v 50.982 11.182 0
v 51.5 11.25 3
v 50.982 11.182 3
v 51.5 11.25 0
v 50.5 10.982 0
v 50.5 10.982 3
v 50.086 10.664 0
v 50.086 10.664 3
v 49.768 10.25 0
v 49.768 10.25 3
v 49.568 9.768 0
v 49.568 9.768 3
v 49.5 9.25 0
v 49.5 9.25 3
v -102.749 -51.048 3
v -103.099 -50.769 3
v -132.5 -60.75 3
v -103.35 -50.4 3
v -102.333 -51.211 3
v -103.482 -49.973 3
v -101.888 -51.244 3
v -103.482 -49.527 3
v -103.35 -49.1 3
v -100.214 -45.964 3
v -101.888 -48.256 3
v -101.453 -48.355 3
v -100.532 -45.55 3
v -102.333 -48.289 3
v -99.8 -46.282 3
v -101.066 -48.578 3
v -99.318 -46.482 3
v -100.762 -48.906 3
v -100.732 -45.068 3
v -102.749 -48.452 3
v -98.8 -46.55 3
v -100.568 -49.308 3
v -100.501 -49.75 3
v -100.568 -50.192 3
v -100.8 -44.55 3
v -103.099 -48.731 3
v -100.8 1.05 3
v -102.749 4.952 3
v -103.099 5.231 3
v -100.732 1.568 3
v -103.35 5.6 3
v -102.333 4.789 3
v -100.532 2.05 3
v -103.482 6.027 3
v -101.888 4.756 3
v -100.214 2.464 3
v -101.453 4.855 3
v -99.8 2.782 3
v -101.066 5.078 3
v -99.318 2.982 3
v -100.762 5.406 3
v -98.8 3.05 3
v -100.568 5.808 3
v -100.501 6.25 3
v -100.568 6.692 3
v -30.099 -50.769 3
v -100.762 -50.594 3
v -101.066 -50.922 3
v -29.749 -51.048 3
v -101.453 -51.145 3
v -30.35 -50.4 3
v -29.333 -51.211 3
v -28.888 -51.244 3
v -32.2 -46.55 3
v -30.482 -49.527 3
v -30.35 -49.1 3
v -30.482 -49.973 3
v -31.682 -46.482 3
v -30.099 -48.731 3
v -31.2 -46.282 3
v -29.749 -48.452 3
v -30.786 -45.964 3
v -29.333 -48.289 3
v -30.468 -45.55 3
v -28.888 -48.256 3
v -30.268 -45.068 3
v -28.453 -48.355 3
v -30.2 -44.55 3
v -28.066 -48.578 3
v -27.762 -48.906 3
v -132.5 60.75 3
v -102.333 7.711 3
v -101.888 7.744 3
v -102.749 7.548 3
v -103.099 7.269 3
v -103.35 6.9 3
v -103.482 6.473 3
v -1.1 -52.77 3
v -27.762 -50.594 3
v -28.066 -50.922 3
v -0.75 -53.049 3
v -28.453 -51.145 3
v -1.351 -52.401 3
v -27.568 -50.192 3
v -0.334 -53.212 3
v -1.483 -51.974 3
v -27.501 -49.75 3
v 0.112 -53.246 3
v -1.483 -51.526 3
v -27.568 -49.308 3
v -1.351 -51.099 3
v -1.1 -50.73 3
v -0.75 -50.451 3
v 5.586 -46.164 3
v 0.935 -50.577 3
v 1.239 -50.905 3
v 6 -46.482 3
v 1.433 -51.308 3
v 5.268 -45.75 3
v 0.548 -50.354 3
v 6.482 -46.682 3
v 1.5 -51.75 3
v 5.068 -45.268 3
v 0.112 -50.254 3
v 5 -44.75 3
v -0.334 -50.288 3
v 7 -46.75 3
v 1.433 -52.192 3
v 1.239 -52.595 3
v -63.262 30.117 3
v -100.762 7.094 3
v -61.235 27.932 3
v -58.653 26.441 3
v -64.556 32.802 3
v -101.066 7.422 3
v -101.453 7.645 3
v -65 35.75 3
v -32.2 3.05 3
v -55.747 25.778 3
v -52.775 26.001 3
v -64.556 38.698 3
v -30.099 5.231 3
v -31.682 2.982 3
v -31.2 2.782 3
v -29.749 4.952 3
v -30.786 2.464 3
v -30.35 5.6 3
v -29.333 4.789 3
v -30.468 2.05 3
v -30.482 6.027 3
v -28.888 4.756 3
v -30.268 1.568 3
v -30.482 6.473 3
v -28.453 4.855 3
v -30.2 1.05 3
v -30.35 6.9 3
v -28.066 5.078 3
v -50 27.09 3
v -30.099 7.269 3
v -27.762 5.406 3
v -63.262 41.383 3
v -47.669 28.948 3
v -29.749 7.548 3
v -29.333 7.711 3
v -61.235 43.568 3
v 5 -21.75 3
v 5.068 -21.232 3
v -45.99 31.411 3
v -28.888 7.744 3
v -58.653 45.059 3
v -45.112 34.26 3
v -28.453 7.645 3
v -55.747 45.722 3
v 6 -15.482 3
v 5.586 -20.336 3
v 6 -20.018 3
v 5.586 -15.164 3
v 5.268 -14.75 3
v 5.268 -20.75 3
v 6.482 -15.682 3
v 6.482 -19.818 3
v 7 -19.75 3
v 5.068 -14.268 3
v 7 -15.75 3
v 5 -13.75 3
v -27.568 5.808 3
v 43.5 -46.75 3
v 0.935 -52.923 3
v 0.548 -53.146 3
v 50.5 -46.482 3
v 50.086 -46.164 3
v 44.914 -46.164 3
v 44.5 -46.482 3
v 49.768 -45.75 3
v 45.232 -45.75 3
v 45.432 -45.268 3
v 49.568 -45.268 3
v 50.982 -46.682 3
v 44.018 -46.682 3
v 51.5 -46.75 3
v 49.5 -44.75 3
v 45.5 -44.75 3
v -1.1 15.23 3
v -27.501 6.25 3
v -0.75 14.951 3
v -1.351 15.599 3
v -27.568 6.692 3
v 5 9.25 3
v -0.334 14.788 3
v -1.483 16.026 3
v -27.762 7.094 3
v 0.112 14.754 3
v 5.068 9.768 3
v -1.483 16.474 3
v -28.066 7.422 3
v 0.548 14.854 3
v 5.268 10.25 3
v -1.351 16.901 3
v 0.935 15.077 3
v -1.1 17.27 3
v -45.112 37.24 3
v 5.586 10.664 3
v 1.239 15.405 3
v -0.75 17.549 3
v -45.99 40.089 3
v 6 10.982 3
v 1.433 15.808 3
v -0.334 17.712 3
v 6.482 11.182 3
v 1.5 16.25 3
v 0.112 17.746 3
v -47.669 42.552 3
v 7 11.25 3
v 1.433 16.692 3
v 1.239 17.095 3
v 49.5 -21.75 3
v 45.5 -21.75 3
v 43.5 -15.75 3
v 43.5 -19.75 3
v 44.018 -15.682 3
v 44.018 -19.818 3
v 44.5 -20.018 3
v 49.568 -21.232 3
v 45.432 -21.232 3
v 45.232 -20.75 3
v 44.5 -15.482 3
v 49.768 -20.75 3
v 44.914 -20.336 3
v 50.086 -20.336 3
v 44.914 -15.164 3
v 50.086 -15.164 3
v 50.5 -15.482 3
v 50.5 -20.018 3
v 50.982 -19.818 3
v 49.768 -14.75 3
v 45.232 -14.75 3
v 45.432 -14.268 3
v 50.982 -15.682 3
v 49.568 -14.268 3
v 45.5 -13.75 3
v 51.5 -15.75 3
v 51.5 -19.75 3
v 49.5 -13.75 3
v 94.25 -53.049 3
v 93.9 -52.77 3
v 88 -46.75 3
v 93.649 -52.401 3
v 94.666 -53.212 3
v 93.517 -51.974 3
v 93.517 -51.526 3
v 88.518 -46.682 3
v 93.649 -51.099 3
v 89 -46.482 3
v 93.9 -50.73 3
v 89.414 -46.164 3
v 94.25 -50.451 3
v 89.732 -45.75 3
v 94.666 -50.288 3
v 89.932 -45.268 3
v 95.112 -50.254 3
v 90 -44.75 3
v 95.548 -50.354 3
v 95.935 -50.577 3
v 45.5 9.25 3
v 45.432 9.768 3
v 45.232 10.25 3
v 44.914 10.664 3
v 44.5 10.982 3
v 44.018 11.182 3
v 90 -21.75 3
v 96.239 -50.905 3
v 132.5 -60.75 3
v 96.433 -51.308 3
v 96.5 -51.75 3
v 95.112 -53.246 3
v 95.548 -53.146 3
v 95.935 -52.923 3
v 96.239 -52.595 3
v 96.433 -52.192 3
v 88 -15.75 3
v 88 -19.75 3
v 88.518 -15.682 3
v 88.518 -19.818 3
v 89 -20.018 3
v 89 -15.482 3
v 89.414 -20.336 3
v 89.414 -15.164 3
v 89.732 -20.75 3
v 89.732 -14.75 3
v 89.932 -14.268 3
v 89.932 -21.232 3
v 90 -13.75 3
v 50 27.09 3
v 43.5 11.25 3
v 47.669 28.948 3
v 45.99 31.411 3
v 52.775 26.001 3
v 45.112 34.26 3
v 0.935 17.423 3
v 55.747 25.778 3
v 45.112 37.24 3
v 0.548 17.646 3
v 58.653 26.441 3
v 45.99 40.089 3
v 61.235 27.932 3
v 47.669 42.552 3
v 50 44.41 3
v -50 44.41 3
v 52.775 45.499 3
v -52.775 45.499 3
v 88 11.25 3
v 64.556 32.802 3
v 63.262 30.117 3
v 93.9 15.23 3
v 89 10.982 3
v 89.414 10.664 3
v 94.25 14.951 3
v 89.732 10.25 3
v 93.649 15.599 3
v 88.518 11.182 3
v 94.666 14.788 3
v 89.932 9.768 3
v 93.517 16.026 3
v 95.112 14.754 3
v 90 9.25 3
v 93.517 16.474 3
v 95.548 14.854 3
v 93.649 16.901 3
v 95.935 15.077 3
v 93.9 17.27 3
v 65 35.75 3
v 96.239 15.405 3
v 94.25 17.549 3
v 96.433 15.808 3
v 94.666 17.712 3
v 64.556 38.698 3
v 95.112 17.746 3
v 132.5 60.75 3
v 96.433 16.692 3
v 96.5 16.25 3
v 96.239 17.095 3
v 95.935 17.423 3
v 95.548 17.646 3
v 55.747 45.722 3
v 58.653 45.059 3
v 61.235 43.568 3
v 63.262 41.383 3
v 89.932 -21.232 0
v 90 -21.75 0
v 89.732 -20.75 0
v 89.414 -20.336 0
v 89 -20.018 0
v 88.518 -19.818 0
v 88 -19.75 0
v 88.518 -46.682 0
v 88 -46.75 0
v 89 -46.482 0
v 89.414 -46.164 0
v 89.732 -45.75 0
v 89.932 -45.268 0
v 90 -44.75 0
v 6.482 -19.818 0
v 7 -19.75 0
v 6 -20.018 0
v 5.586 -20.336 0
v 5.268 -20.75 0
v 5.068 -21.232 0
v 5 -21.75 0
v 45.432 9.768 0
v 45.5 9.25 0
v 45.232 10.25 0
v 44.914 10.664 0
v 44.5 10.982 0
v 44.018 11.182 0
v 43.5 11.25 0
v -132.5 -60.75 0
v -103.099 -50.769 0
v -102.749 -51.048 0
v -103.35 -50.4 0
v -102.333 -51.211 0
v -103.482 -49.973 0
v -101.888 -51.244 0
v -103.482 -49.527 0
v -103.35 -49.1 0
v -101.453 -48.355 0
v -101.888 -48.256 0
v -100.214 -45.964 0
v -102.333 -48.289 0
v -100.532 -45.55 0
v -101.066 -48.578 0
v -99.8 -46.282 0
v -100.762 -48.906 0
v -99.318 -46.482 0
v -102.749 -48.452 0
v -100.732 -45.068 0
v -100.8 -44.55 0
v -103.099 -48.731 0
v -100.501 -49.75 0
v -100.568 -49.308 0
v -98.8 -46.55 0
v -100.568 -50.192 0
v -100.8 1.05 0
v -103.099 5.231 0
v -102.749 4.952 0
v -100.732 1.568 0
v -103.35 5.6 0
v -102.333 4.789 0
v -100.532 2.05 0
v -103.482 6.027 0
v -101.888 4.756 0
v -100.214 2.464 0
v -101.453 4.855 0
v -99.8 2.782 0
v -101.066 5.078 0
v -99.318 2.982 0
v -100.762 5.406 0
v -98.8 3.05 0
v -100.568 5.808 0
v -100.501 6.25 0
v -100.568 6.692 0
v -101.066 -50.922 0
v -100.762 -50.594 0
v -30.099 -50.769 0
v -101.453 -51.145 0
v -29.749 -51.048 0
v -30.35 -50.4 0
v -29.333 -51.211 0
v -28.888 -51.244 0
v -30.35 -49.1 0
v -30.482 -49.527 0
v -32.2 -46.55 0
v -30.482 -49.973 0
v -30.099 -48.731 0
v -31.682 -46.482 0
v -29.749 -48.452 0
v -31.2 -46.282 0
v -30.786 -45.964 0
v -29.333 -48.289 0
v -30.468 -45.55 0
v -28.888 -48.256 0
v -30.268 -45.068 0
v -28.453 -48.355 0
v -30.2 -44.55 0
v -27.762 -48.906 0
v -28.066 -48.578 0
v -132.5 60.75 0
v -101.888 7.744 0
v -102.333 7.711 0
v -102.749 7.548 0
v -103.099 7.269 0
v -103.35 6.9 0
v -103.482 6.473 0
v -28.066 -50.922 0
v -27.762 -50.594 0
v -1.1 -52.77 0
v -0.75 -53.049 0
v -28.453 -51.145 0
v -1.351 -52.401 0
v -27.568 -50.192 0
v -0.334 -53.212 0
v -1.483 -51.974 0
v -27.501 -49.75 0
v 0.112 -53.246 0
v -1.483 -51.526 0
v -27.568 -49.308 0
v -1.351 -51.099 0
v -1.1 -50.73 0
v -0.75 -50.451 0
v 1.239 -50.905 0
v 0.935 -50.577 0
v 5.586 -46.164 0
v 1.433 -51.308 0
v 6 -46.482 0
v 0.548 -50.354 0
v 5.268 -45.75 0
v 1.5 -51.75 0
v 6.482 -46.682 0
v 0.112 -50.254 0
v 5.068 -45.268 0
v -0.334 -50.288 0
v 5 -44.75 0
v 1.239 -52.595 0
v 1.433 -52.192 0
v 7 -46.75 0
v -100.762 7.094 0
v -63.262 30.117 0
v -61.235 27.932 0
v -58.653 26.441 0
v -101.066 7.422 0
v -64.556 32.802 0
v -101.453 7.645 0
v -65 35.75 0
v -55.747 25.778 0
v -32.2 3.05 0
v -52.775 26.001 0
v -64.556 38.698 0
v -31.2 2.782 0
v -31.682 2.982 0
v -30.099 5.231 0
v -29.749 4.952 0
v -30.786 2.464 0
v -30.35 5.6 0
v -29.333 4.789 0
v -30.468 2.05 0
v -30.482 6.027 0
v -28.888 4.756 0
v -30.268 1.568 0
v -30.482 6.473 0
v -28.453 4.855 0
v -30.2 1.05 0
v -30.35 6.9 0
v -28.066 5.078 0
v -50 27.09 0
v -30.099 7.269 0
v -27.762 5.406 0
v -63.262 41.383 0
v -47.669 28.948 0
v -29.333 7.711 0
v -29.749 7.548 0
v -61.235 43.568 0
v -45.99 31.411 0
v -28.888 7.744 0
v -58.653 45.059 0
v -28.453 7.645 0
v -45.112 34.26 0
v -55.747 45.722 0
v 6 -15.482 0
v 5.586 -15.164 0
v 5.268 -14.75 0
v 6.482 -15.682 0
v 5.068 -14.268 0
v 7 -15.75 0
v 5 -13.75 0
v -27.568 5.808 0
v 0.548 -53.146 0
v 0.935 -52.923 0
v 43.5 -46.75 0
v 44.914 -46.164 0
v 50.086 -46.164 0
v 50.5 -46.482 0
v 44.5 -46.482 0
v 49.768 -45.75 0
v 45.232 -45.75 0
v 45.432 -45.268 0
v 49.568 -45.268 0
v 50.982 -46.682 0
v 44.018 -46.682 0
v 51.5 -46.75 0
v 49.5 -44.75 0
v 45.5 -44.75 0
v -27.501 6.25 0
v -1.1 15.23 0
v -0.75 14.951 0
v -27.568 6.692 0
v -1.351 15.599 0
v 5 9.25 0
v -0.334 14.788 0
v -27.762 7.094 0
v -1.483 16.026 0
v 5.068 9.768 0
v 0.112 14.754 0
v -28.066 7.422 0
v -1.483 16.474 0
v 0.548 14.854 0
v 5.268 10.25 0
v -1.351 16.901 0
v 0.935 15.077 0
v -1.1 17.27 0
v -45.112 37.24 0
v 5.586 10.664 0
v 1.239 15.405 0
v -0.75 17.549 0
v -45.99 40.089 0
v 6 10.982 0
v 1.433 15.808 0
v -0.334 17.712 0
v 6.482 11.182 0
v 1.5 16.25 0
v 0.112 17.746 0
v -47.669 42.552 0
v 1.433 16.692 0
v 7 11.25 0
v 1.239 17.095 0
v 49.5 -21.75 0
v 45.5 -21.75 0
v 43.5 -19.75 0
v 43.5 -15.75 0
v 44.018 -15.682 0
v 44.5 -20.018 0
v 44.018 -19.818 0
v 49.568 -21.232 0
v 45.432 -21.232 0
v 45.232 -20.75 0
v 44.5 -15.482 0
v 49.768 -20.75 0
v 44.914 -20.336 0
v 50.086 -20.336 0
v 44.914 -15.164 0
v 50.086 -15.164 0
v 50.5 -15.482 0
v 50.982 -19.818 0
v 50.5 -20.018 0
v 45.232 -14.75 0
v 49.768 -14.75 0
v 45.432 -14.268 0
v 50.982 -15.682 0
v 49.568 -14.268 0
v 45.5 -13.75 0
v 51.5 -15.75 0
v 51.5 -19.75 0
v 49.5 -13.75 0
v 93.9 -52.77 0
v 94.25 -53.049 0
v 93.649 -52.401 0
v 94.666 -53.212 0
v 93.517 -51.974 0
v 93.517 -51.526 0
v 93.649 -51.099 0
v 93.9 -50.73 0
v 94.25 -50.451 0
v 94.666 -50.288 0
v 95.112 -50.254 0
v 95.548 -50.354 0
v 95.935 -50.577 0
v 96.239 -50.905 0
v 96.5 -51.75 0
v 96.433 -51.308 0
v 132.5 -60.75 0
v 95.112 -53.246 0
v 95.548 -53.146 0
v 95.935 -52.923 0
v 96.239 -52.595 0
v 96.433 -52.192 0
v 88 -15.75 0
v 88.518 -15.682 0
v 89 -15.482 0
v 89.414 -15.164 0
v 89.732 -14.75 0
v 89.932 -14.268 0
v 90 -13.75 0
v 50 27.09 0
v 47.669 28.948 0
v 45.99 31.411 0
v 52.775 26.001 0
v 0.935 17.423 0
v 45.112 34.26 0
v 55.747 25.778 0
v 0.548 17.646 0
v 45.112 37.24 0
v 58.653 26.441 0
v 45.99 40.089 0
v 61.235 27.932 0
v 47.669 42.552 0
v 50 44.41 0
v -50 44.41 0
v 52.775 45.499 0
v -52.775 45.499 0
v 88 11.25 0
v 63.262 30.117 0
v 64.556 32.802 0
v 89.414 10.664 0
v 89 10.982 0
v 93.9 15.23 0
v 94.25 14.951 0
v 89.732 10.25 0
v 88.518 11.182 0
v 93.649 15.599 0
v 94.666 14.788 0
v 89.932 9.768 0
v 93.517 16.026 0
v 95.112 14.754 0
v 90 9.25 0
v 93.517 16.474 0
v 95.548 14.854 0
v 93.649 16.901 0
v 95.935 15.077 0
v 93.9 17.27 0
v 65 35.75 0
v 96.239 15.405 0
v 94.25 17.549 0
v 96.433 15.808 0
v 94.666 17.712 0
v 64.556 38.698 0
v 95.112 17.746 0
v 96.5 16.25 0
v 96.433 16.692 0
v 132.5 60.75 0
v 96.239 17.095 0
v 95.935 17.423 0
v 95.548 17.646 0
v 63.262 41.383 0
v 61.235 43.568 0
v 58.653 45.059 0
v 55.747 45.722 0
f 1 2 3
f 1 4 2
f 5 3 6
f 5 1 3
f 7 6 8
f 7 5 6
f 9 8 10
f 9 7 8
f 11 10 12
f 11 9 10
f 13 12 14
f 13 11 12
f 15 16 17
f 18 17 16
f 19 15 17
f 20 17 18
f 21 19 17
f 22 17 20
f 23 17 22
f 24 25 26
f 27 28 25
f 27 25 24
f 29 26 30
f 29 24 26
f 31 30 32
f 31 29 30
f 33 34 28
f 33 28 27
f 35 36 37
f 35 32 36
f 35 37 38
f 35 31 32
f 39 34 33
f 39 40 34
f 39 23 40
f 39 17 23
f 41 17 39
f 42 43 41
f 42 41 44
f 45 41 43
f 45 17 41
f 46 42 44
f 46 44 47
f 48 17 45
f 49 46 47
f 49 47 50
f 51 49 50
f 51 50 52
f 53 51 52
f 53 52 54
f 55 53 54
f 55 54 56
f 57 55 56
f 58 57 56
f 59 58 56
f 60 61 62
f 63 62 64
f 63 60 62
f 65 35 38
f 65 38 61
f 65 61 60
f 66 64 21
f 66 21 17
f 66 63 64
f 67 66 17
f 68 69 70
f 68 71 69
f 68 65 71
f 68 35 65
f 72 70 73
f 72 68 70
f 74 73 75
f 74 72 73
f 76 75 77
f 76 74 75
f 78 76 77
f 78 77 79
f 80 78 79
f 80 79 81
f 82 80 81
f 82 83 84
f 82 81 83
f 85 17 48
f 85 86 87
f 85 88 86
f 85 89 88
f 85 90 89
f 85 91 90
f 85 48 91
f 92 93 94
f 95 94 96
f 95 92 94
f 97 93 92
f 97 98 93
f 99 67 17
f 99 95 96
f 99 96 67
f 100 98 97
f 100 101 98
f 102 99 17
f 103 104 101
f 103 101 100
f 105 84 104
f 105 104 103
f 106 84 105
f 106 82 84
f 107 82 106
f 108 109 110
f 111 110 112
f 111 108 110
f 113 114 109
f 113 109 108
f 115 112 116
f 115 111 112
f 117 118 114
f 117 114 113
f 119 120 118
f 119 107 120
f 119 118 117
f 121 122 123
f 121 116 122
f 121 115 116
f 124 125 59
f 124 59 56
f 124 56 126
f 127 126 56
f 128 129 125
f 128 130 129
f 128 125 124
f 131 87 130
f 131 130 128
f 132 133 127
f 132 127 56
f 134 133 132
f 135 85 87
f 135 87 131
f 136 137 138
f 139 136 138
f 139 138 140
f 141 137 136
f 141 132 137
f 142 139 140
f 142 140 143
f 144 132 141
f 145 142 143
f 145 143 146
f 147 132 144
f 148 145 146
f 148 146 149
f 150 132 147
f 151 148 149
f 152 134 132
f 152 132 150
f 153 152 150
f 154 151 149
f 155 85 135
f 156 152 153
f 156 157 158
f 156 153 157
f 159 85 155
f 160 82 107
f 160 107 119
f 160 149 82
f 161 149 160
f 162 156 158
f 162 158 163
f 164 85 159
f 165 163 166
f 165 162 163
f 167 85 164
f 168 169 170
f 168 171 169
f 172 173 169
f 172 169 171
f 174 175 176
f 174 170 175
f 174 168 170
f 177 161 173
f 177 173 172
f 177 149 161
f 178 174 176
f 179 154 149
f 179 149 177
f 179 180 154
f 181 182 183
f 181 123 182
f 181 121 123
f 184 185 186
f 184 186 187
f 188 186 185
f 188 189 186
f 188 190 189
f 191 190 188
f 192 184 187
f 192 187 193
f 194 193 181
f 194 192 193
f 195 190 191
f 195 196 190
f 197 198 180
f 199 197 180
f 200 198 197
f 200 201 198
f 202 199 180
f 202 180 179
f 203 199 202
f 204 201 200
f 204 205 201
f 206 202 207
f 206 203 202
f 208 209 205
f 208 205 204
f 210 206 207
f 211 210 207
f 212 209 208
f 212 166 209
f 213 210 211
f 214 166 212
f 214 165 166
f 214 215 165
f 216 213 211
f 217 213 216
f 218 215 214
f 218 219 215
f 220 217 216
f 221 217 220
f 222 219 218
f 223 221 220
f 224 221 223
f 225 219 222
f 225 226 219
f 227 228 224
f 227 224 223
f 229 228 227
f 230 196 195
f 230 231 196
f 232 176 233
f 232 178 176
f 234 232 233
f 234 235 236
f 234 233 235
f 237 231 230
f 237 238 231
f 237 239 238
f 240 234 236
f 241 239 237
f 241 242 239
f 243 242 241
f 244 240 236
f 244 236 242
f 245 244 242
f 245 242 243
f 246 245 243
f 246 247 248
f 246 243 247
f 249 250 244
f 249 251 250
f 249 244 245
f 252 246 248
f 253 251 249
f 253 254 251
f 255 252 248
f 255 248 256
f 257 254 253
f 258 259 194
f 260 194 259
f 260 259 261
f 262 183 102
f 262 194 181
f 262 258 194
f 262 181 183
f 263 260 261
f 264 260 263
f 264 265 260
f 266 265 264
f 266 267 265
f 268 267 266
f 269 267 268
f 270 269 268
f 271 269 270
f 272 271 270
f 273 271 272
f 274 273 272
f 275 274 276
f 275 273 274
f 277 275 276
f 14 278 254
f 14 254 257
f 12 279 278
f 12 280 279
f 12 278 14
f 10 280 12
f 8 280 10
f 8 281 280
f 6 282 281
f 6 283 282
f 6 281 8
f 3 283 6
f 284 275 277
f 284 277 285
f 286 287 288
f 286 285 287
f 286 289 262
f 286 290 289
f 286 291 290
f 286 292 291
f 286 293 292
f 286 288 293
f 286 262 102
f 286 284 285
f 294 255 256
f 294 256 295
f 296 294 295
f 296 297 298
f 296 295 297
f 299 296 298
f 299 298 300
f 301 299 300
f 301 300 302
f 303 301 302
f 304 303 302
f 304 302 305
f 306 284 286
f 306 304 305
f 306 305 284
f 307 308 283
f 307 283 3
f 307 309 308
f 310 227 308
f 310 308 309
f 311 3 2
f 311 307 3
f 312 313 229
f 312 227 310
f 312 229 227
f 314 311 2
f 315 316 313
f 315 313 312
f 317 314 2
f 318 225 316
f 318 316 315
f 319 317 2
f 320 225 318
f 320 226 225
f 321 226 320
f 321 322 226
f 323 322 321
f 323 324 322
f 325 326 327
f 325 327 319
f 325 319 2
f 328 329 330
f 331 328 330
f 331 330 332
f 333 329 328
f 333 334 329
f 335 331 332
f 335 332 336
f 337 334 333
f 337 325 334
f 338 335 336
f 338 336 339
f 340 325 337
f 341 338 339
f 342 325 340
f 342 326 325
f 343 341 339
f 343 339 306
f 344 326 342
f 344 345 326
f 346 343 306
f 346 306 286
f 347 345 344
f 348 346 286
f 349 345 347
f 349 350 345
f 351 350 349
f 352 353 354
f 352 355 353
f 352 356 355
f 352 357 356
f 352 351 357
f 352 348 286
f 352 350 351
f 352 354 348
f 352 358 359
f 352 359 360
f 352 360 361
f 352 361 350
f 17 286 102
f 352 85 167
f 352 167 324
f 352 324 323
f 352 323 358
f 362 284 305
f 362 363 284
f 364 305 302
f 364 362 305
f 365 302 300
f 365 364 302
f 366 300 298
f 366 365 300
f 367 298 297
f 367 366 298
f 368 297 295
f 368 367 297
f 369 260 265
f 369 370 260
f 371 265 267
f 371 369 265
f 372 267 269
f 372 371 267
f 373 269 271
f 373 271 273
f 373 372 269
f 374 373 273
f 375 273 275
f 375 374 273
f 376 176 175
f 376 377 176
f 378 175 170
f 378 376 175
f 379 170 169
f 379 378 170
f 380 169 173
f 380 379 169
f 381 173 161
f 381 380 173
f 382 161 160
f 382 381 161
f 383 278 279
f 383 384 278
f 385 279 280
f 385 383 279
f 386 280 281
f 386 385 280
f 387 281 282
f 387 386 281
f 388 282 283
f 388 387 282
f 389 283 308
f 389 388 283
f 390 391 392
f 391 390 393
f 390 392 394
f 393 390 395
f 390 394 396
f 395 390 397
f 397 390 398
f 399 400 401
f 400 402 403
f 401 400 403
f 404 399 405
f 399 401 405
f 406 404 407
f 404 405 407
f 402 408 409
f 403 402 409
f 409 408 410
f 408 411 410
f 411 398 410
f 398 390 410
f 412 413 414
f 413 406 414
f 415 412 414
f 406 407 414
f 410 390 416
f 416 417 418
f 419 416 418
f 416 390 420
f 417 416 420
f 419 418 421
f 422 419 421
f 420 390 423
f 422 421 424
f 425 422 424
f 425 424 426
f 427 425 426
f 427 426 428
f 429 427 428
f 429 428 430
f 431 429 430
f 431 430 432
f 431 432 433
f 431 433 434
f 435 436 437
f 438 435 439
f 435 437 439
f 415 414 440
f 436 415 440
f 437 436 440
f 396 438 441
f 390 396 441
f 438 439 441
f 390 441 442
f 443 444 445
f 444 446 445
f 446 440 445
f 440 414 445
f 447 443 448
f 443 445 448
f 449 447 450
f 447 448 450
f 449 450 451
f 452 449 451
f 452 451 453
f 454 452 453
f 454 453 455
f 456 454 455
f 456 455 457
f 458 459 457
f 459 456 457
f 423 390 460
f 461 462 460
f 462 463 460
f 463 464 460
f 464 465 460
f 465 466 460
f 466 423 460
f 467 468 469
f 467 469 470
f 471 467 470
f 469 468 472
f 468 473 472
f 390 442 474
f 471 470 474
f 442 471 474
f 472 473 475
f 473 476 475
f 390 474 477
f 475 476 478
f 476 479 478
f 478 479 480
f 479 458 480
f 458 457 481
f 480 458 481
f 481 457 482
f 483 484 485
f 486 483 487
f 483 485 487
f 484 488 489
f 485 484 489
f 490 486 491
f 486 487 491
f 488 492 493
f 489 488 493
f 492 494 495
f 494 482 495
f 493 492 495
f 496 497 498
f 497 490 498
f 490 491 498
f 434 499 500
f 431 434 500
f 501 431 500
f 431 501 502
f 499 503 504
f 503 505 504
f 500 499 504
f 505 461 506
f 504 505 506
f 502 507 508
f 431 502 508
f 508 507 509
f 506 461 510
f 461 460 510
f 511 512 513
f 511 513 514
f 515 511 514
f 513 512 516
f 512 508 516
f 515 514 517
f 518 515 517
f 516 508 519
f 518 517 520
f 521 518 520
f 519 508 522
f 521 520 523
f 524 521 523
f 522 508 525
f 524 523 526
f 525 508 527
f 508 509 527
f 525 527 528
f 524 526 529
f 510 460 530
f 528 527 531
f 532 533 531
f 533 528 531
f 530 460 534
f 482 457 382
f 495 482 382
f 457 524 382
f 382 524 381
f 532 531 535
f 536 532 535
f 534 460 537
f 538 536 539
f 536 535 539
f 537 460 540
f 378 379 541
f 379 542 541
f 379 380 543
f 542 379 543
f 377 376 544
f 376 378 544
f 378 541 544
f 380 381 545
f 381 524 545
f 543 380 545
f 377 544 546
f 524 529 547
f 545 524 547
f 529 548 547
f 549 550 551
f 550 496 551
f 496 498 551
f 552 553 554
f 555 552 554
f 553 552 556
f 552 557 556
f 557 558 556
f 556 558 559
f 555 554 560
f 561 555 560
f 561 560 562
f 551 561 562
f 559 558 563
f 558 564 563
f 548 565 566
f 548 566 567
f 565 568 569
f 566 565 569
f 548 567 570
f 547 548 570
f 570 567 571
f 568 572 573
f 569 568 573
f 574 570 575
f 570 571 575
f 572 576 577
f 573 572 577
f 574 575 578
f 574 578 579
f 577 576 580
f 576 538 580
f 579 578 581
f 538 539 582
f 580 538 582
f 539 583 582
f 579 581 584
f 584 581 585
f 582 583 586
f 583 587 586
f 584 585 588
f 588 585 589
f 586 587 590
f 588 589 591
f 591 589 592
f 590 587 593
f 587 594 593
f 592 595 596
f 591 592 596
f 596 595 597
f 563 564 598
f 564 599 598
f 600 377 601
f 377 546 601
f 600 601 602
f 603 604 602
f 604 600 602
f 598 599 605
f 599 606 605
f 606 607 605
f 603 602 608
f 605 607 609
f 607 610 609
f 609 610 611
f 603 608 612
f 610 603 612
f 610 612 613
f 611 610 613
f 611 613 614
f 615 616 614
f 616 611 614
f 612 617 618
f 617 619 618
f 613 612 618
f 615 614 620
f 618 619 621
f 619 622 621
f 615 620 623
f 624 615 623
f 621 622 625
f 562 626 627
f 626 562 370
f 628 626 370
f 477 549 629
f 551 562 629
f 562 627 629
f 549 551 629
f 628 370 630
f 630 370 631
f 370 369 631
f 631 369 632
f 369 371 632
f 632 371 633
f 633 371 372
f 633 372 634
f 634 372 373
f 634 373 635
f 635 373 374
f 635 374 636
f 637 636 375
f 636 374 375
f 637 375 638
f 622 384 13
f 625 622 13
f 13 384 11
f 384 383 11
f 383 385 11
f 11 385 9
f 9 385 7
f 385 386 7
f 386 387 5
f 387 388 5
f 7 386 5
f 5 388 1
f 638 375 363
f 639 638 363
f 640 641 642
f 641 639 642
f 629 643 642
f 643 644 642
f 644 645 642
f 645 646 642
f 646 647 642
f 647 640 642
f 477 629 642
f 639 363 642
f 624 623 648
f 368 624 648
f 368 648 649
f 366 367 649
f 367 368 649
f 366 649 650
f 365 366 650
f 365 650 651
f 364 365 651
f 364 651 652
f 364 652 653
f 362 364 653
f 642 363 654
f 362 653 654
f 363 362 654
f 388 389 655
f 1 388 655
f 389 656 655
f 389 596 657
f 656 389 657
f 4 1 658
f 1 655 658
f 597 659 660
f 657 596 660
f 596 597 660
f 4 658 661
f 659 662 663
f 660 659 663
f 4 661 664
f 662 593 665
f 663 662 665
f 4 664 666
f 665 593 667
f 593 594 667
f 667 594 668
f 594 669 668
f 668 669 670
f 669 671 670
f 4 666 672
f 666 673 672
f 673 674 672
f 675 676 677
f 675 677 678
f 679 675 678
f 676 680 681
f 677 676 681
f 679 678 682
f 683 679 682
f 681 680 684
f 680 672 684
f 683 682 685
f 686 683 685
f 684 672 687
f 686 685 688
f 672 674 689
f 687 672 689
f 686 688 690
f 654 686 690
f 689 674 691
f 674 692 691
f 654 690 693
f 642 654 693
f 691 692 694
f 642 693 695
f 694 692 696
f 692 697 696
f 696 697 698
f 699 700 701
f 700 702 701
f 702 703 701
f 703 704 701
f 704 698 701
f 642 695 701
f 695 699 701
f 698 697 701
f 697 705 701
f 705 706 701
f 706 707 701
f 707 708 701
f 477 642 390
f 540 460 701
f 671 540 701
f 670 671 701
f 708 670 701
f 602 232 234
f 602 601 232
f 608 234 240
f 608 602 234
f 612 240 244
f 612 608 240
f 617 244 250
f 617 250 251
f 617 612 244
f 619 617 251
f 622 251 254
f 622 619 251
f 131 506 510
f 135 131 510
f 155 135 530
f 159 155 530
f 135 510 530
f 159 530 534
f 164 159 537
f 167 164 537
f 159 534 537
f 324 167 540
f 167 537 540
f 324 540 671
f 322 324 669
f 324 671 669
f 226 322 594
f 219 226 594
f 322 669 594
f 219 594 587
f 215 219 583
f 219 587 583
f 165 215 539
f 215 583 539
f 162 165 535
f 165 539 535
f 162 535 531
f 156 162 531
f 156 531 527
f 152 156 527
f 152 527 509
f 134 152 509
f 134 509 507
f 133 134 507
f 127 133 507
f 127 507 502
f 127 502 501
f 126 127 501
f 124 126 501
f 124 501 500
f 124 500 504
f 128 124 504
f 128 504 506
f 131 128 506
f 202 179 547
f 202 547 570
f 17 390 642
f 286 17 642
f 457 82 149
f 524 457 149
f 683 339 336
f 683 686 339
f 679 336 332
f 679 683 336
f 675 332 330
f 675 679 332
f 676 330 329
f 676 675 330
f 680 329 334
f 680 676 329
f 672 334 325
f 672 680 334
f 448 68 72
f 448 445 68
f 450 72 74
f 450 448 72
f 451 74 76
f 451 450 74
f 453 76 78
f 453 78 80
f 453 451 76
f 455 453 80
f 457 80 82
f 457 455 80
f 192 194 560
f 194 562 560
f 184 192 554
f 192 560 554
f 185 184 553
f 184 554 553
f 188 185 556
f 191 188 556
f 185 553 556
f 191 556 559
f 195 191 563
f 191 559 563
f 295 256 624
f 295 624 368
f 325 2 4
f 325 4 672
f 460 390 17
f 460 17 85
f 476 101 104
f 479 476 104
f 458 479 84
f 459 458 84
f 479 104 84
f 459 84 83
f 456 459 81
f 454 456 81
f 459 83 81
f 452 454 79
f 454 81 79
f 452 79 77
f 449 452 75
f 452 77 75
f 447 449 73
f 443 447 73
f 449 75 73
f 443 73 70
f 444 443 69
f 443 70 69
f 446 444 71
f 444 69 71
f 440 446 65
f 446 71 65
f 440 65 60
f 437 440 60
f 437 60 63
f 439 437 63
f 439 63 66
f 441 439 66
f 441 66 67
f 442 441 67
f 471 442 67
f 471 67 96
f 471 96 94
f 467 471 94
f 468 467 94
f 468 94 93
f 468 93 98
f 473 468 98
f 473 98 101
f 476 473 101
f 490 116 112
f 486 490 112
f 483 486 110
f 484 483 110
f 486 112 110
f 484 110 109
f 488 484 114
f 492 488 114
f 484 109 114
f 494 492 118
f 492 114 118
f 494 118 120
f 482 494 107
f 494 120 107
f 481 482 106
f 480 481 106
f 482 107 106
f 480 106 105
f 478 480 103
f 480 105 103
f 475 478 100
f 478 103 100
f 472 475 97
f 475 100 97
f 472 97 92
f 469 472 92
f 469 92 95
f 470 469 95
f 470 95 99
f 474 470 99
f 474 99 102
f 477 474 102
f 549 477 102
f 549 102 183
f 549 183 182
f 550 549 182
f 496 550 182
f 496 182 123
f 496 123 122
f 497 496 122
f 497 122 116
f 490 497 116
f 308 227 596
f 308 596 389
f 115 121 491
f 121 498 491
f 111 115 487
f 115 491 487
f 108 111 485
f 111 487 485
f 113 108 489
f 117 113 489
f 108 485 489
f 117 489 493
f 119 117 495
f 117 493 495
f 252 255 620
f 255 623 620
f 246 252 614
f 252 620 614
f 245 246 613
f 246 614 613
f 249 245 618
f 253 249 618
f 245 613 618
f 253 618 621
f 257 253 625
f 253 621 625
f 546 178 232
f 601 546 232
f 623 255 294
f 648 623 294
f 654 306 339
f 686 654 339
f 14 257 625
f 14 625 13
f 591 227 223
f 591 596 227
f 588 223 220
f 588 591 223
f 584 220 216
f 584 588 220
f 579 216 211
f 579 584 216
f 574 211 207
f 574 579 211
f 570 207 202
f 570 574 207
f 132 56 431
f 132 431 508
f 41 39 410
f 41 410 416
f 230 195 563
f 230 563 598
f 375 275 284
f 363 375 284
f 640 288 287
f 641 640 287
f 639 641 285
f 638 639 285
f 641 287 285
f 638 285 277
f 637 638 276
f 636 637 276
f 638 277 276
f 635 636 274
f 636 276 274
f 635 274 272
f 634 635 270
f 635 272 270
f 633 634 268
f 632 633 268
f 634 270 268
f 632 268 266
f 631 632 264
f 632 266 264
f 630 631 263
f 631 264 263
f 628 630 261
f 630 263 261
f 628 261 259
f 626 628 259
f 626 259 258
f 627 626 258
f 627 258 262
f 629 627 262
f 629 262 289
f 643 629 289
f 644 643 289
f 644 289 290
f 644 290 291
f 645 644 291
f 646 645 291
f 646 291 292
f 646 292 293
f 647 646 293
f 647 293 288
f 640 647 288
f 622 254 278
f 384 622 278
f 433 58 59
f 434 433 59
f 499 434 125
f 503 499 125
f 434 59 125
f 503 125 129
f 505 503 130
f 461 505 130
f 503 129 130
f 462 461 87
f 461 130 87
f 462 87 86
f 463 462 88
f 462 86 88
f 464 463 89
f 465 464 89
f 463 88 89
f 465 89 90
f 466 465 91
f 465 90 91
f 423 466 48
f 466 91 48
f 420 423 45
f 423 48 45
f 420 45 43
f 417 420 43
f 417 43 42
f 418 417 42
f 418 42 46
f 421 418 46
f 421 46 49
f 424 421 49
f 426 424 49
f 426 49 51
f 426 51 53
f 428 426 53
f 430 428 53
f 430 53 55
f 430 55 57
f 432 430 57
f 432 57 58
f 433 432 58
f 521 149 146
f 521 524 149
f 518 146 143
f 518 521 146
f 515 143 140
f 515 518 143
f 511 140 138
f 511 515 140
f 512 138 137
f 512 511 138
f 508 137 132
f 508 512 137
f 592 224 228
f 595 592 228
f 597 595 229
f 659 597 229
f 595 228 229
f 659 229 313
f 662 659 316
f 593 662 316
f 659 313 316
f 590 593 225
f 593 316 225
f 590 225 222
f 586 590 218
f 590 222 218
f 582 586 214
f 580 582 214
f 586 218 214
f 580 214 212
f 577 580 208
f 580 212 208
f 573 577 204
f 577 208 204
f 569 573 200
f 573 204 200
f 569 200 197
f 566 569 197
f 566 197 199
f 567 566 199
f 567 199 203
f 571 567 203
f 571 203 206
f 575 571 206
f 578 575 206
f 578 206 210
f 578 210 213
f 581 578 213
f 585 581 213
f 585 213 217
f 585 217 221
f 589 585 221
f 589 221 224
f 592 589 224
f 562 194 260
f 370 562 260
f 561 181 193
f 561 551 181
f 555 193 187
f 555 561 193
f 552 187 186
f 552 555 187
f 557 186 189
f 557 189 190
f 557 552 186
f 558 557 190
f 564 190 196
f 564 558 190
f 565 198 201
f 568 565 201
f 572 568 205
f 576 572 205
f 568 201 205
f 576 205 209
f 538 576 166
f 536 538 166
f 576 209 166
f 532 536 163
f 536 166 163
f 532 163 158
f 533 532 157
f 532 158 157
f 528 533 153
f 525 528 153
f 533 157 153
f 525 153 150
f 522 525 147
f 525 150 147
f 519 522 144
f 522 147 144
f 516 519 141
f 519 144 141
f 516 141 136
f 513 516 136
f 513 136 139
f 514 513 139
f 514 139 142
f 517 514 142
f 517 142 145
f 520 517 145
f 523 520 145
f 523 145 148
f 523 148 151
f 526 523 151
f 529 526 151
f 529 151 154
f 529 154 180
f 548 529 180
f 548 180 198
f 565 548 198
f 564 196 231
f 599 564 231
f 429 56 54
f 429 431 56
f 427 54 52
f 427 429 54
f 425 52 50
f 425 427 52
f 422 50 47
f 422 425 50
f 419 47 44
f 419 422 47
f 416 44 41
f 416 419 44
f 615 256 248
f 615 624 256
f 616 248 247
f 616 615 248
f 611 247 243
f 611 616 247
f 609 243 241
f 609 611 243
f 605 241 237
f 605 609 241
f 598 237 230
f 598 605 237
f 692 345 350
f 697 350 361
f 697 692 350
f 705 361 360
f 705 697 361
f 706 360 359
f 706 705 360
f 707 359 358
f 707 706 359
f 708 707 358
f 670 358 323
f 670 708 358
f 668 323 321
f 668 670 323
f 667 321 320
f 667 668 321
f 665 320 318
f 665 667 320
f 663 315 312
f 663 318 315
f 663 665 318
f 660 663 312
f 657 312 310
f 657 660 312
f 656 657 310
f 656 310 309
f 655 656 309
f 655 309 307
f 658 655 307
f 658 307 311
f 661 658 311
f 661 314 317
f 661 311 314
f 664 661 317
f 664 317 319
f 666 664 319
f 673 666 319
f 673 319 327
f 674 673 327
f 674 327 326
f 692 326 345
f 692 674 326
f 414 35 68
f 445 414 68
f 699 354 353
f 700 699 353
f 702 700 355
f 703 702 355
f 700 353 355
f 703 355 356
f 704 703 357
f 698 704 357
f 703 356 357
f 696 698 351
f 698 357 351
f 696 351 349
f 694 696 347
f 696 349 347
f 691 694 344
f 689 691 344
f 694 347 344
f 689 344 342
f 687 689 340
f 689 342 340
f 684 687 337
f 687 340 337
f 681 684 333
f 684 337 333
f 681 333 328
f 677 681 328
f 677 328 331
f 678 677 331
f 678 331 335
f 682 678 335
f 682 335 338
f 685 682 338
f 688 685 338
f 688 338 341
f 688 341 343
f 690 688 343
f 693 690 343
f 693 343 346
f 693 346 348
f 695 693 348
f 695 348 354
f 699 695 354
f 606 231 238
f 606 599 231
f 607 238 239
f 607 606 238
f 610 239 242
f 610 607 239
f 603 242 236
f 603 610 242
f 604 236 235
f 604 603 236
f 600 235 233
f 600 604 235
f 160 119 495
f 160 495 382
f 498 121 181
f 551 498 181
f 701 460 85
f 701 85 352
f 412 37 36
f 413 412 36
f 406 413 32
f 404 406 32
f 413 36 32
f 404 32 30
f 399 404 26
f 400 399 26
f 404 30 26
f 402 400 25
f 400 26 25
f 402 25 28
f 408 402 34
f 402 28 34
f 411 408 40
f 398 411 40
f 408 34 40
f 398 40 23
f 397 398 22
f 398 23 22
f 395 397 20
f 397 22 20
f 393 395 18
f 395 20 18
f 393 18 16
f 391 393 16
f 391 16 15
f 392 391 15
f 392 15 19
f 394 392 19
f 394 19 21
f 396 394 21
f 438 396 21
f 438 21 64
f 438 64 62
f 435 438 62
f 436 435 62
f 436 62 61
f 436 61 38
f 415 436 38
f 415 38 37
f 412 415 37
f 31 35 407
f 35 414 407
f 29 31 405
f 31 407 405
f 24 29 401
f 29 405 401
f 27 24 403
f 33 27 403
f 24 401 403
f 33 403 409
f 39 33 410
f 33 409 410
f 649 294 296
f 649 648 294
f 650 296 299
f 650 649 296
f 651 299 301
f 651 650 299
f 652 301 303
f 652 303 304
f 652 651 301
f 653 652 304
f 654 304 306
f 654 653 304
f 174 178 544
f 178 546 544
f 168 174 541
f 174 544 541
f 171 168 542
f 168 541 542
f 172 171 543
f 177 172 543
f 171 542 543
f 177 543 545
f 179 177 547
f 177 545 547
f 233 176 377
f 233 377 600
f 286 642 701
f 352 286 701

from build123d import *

# Parameters (mm, degrees)
SKETCH_1_W          = 265
SKETCH_1_H          = 121.5
EXTRUDE_1_DEPTH     = 3
SKETCH_2_R          = 10
CUT_EXTRUDE_1_DEPTH = 10
SKETCH_3_W          = 70.6
SKETCH_3_H          = 49.6
CUT_EXTRUDE_2_DEPTH = 3
FILLET_1_R          = 2
SKETCH_4_R          = 1.498589197
CUT_EXTRUDE_3_DEPTH = 10
SKETCH_5_R          = 1.5
CUT_EXTRUDE_4_DEPTH = 42
SKETCH_6_W          = 40.5
SKETCH_6_H          = 27
CUT_EXTRUDE_5_DEPTH = 22
FILLET_2_R          = 2


with BuildPart() as part:
    # 草图1 → 凸台-拉伸1 (new body)
    with BuildSketch(Plane.XY):
        Rectangle(SKETCH_1_W, SKETCH_1_H)
    extrude(amount=EXTRUDE_1_DEPTH)

    # 草图2 → 切除-拉伸1 (cut)
    with BuildSketch(Plane(origin=(0, 0, 0), x_dir=(-1, 0, 0), z_dir=(0, 0, -1))):
        with Locations((55, 35.75)):
            Circle(SKETCH_2_R)
    cut_extrude_1 = extrude(amount=-CUT_EXTRUDE_1_DEPTH, mode=Mode.SUBTRACT)

    # 镜向1: 切除-拉伸1 across plane
    add(cut_extrude_1.mirror(Plane(origin=(0, 0, 0), x_dir=(0, 0, 1), z_dir=(1, 0, 0))), mode=Mode.SUBTRACT)

    # 草图3 → 切除-拉伸2 (cut)
    with BuildSketch(Plane.XY.offset(3)):
        with Locations((-65.5, -21.75)):
            Rectangle(SKETCH_3_W, SKETCH_3_H)
    extrude(amount=-CUT_EXTRUDE_2_DEPTH, mode=Mode.SUBTRACT)

    # 圆角1
    fillet_1_edges = [part.edges().sort_by_distance(p)[0] for p in [
        (-100.8, 3.05, 1.5),
        (-100.8, -46.55, 1.5),
        (-30.2, -46.55, 1.5),
        (-30.2, 3.05, 1.5),
    ]]
    fillet(fillet_1_edges, radius=FILLET_1_R)

    # 草图4 → 切除-拉伸3 (cut)
    with BuildSketch(Plane.XY.offset(3)):
        with Locations((-29, -49.75)):
            Circle(SKETCH_4_R)
        with Locations((-29, 6.25)):
            Circle(SKETCH_4_R)
        with Locations((-102, -49.75)):
            Circle(SKETCH_4_R)
        with Locations((-102, 6.25)):
            Circle(SKETCH_4_R)
    extrude(amount=-CUT_EXTRUDE_3_DEPTH, mode=Mode.SUBTRACT)

    # 草图5 → 切除-拉伸4 (cut)
    with BuildSketch(Plane.XY.offset(3)):
        with Locations((95, 16.25)):
            Circle(SKETCH_5_R)
        with Locations((95, -51.75)):
            Circle(SKETCH_5_R)
        with Locations((0, -51.75)):
            Circle(SKETCH_5_R)
        with Locations((0, 16.25)):
            Circle(SKETCH_5_R)
    extrude(amount=-CUT_EXTRUDE_4_DEPTH, mode=Mode.SUBTRACT)

    # 草图6 → 切除-拉伸5 (cut)
    with BuildSketch(Plane.XY.offset(3)):
        with Locations((25.25, -33.25)):
            Rectangle(SKETCH_6_W, SKETCH_6_H)
        with Locations((25.25, -2.25)):
            Rectangle(SKETCH_6_W, SKETCH_6_H)
        with Locations((69.75, -2.25)):
            Rectangle(SKETCH_6_W, SKETCH_6_H)
        with Locations((69.75, -33.25)):
            Rectangle(SKETCH_6_W, SKETCH_6_H)
    extrude(amount=-CUT_EXTRUDE_5_DEPTH, mode=Mode.SUBTRACT)

    # 圆角2
    fillet_2_edges = [part.edges().sort_by_distance(p)[0] for p in [
        (49.5, -19.75, 1.5),
        (90, -19.75, 1.5),
        (90, -46.75, 1.5),
        (49.5, -46.75, 1.5),
        (49.5, 11.25, 1.5),
        (90, 11.25, 1.5),
        (90, -15.75, 1.5),
        (49.5, -15.75, 1.5),
        (5, -15.75, 1.5),
        (5, 11.25, 1.5),
        (45.5, 11.25, 1.5),
        (45.5, -15.75, 1.5),
        (45.5, -19.75, 1.5),
        (45.5, -46.75, 1.5),
        (5, -46.75, 1.5),
        (5, -19.75, 1.5),
    ]]
    fillet(fillet_2_edges, radius=FILLET_2_R)


solid = part.part
